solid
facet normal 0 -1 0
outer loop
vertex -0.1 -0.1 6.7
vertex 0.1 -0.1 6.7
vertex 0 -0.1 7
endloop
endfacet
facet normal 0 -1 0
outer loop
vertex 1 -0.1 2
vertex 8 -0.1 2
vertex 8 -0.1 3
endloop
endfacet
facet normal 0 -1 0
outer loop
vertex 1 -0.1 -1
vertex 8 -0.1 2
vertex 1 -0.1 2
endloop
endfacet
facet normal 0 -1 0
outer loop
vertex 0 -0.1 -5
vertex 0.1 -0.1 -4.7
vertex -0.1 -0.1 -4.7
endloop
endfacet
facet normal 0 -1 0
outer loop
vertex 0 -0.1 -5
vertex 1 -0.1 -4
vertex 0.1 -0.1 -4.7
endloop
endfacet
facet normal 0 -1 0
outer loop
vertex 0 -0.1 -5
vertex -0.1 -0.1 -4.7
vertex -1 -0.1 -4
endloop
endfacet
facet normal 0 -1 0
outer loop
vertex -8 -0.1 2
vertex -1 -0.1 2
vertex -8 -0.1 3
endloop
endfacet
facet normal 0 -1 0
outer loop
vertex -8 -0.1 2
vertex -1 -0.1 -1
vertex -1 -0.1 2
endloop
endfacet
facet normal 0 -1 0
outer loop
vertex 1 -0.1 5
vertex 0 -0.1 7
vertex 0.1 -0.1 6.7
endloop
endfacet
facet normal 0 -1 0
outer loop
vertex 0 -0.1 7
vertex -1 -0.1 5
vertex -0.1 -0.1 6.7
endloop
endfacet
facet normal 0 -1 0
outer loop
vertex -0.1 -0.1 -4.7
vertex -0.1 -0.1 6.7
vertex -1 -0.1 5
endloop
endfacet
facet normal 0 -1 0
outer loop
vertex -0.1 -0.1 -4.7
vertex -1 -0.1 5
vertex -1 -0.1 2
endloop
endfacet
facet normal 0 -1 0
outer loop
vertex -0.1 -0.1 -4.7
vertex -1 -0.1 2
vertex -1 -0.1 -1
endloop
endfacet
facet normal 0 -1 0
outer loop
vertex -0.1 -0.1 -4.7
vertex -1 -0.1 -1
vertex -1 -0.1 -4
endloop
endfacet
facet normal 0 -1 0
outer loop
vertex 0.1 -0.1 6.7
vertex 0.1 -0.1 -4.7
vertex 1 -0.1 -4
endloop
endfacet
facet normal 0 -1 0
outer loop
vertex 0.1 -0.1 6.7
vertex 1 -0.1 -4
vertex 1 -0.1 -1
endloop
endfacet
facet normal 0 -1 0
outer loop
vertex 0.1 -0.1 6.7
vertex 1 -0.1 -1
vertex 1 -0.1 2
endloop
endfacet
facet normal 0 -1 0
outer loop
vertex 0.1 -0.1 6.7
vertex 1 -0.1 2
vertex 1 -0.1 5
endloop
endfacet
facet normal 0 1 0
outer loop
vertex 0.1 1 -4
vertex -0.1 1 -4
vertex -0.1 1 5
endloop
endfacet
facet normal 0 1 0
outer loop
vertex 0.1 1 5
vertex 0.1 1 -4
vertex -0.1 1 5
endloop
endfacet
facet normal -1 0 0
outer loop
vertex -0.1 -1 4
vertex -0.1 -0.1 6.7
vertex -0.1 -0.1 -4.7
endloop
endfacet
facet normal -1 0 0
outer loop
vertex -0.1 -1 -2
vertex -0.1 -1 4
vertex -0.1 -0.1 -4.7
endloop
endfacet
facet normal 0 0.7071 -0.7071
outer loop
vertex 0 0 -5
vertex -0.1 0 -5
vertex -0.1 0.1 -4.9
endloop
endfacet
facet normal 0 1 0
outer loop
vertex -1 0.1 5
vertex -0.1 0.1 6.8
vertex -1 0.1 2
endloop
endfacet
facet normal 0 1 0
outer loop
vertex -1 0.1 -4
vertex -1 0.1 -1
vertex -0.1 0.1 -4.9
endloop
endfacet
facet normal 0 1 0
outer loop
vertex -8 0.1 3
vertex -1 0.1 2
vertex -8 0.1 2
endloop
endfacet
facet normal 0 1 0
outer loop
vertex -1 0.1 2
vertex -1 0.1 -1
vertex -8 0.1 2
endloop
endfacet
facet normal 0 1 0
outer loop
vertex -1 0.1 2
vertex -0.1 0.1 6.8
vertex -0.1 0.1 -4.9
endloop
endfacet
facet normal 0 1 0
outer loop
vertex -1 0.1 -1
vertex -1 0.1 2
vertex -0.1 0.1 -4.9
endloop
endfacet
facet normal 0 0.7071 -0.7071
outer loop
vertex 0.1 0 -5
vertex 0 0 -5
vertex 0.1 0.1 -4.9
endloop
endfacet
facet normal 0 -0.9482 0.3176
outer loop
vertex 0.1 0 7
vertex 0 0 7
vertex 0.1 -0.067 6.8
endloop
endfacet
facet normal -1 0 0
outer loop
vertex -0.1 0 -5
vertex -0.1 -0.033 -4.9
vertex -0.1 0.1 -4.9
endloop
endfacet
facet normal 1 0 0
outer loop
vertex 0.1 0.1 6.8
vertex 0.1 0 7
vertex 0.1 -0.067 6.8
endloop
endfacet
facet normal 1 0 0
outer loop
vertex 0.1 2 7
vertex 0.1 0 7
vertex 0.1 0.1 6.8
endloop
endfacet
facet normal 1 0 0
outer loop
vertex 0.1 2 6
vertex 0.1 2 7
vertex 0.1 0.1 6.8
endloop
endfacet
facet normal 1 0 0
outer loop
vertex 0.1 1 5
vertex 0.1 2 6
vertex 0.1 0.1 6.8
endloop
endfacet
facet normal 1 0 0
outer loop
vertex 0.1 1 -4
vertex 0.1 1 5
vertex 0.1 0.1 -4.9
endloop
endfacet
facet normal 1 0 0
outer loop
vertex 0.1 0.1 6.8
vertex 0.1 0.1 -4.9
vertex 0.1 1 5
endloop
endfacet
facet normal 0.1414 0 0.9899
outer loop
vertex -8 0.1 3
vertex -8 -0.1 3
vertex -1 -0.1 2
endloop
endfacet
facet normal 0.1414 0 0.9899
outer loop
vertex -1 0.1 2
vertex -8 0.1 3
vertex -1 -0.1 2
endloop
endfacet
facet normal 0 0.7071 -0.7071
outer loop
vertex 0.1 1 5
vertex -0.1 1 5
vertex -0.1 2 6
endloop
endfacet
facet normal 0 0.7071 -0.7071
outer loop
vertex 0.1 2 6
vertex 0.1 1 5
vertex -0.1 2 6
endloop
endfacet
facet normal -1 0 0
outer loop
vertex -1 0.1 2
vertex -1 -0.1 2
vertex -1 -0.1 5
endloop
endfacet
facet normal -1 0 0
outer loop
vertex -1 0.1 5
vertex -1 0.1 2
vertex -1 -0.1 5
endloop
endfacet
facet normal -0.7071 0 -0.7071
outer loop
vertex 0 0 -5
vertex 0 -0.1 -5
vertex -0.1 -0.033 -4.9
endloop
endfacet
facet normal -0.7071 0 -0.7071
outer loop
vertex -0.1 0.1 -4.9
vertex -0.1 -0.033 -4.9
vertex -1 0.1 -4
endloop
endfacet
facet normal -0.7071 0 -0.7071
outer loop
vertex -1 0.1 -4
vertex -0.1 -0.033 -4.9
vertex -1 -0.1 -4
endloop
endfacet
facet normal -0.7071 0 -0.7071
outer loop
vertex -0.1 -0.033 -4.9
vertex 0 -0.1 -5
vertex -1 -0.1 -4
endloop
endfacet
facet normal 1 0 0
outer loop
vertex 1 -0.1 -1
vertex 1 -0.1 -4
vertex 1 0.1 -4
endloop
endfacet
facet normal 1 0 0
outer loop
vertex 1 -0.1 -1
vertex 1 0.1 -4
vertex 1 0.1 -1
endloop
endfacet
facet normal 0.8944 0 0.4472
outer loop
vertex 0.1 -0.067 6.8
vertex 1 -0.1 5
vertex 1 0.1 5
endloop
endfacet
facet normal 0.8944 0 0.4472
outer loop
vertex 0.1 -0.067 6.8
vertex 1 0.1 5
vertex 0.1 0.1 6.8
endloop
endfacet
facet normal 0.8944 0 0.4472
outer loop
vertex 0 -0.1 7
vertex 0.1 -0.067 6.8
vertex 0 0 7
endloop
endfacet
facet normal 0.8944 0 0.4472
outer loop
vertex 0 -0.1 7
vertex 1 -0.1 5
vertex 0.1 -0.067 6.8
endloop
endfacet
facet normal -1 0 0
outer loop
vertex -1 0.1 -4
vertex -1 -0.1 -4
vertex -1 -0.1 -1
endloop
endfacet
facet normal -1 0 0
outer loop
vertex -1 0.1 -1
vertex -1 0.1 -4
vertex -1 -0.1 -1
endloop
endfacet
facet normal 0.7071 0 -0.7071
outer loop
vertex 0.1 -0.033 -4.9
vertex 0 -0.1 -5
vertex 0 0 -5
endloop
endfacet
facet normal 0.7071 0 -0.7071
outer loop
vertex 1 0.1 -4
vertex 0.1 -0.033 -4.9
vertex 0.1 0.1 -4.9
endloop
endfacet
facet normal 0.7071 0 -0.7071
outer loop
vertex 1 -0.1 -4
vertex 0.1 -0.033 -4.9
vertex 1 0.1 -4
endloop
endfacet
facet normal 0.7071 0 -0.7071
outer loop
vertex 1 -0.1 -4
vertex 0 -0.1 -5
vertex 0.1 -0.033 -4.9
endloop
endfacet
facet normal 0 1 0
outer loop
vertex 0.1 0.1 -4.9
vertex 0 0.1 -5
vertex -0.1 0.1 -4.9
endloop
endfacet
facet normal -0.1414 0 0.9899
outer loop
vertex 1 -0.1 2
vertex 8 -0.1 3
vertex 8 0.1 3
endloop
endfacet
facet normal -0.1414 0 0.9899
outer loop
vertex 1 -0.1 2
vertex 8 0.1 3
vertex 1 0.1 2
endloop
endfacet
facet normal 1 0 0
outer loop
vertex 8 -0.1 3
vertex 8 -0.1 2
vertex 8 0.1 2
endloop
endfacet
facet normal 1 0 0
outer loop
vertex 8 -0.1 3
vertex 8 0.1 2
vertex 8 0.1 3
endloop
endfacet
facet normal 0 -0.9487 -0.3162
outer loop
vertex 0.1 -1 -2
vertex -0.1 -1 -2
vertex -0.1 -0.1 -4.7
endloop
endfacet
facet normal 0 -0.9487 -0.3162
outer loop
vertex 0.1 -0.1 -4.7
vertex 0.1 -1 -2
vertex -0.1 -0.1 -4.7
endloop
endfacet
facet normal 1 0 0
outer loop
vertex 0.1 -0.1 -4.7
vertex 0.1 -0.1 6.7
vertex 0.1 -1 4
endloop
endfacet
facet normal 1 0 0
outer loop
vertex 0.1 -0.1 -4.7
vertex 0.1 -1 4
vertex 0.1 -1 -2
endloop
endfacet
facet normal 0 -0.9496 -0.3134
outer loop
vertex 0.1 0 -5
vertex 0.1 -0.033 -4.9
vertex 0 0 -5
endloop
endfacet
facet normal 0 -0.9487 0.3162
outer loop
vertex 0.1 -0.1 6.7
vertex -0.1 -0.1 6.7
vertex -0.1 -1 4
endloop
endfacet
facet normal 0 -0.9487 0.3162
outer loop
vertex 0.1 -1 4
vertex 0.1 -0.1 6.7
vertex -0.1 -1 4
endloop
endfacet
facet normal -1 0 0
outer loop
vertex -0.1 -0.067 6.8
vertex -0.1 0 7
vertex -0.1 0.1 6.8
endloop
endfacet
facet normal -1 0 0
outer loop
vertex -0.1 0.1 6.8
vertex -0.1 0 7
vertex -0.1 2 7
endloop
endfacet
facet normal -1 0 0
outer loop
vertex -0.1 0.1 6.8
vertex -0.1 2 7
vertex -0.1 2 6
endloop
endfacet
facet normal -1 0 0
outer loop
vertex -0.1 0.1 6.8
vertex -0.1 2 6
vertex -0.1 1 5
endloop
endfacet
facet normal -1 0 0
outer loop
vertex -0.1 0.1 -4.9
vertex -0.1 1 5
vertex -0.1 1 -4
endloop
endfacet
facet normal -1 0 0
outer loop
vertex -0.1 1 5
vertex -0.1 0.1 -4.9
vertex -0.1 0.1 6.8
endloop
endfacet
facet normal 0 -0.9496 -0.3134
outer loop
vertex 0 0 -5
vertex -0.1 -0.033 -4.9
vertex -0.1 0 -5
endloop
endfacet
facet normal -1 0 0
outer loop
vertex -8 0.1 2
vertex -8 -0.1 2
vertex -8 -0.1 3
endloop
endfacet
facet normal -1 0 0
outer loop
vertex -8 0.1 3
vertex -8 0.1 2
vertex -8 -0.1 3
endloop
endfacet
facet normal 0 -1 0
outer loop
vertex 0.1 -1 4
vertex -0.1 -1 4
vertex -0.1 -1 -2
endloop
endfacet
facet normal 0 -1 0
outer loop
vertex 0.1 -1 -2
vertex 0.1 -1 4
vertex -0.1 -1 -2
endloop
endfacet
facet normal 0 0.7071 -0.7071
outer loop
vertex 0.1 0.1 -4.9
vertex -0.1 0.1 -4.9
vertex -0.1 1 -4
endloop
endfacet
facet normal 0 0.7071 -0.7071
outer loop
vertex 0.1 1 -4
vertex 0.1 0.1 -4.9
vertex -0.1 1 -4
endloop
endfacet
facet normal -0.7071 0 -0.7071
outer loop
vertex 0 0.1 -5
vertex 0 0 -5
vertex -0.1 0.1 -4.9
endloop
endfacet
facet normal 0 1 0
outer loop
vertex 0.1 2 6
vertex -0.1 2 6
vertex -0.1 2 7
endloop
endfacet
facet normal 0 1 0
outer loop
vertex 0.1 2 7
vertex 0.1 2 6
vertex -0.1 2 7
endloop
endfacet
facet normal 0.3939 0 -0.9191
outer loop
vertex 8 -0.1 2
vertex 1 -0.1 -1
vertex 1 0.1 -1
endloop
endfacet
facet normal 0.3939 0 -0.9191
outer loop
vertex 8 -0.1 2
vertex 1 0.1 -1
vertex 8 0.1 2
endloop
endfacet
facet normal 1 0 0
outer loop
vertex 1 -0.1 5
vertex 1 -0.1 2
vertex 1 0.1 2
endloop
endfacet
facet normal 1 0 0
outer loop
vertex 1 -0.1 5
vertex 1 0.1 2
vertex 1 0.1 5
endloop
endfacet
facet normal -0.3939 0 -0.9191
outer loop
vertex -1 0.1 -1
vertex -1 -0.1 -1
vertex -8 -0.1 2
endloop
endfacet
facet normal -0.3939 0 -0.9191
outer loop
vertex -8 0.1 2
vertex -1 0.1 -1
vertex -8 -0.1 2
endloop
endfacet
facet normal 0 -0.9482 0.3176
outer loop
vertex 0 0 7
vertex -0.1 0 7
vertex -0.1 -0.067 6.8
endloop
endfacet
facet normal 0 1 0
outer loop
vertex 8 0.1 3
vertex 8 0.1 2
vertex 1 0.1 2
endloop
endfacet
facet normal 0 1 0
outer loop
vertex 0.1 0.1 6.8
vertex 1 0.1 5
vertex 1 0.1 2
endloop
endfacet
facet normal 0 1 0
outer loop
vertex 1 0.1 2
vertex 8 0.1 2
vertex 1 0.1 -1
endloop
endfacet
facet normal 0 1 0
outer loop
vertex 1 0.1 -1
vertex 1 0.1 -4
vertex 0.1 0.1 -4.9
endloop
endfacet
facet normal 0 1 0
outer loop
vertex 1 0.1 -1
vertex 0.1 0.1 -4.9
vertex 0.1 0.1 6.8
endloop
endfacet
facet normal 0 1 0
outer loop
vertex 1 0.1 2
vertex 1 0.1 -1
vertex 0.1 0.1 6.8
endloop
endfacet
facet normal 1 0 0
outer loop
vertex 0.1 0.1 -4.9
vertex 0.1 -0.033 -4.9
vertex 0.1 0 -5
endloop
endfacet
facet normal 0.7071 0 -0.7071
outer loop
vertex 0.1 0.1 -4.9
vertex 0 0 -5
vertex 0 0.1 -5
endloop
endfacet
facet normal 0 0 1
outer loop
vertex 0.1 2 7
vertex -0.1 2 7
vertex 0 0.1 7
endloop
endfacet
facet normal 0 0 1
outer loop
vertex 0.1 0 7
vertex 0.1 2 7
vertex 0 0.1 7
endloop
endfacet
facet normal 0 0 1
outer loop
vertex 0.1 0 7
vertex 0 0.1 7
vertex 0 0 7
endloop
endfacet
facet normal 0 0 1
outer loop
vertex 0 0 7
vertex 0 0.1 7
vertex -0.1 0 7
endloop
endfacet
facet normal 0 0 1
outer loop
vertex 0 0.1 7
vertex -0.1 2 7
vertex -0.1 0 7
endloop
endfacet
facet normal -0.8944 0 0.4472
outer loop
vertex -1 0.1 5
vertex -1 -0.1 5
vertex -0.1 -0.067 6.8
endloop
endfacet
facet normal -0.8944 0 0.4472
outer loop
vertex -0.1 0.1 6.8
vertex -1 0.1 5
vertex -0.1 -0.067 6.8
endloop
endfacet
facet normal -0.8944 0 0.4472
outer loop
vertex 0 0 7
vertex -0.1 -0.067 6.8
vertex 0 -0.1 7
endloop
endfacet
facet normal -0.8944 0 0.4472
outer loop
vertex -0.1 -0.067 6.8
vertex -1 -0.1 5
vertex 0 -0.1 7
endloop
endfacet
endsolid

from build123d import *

# Parameters (mm, degrees)
BOSS_EXTRUDE1_DEPTH      = 0.1
BOSS_EXTRUDE1_DEPTH_BACK = 0.1
BOSS_EXTRUDE2_DEPTH      = 0.1
BOSS_EXTRUDE2_DEPTH_BACK = 0.1


with BuildPart() as part:
    # Sketch1 → Boss-Extrude1 (new, two sides: drawn at the far end of the back side and taken through both)
    with BuildSketch(Plane(origin=(0, 0, 0), x_dir=(1, 0, 0), z_dir=(0, 1, 0)).offset(-BOSS_EXTRUDE1_DEPTH_BACK)):
        Polygon((1, 4), (0, 5), (-1, 4), (-1, 1), (-8, -2), (-8, -3), (-1, -2), (-1, -5), (0, -7), (1, -5), (1, -2), (8, -3), (8, -2), (1, 1), align=None)
    extrude(amount=BOSS_EXTRUDE1_DEPTH + BOSS_EXTRUDE1_DEPTH_BACK)

    # Sketch2 → Boss-Extrude2 (add, two sides: drawn at the far end of the back side and taken through both)
    with BuildSketch(Plane(origin=(0, 0, 0), x_dir=(0, 0, -1), z_dir=(1, 0, 0)).offset(-BOSS_EXTRUDE2_DEPTH_BACK)):
        Polygon((5, 0), (4, 1), (-5, 1), (-6, 2), (-7, 2), (-7, 0), (-4, -1), (2, -1), align=None)
    extrude(amount=BOSS_EXTRUDE2_DEPTH + BOSS_EXTRUDE2_DEPTH_BACK)


solid = part.part
